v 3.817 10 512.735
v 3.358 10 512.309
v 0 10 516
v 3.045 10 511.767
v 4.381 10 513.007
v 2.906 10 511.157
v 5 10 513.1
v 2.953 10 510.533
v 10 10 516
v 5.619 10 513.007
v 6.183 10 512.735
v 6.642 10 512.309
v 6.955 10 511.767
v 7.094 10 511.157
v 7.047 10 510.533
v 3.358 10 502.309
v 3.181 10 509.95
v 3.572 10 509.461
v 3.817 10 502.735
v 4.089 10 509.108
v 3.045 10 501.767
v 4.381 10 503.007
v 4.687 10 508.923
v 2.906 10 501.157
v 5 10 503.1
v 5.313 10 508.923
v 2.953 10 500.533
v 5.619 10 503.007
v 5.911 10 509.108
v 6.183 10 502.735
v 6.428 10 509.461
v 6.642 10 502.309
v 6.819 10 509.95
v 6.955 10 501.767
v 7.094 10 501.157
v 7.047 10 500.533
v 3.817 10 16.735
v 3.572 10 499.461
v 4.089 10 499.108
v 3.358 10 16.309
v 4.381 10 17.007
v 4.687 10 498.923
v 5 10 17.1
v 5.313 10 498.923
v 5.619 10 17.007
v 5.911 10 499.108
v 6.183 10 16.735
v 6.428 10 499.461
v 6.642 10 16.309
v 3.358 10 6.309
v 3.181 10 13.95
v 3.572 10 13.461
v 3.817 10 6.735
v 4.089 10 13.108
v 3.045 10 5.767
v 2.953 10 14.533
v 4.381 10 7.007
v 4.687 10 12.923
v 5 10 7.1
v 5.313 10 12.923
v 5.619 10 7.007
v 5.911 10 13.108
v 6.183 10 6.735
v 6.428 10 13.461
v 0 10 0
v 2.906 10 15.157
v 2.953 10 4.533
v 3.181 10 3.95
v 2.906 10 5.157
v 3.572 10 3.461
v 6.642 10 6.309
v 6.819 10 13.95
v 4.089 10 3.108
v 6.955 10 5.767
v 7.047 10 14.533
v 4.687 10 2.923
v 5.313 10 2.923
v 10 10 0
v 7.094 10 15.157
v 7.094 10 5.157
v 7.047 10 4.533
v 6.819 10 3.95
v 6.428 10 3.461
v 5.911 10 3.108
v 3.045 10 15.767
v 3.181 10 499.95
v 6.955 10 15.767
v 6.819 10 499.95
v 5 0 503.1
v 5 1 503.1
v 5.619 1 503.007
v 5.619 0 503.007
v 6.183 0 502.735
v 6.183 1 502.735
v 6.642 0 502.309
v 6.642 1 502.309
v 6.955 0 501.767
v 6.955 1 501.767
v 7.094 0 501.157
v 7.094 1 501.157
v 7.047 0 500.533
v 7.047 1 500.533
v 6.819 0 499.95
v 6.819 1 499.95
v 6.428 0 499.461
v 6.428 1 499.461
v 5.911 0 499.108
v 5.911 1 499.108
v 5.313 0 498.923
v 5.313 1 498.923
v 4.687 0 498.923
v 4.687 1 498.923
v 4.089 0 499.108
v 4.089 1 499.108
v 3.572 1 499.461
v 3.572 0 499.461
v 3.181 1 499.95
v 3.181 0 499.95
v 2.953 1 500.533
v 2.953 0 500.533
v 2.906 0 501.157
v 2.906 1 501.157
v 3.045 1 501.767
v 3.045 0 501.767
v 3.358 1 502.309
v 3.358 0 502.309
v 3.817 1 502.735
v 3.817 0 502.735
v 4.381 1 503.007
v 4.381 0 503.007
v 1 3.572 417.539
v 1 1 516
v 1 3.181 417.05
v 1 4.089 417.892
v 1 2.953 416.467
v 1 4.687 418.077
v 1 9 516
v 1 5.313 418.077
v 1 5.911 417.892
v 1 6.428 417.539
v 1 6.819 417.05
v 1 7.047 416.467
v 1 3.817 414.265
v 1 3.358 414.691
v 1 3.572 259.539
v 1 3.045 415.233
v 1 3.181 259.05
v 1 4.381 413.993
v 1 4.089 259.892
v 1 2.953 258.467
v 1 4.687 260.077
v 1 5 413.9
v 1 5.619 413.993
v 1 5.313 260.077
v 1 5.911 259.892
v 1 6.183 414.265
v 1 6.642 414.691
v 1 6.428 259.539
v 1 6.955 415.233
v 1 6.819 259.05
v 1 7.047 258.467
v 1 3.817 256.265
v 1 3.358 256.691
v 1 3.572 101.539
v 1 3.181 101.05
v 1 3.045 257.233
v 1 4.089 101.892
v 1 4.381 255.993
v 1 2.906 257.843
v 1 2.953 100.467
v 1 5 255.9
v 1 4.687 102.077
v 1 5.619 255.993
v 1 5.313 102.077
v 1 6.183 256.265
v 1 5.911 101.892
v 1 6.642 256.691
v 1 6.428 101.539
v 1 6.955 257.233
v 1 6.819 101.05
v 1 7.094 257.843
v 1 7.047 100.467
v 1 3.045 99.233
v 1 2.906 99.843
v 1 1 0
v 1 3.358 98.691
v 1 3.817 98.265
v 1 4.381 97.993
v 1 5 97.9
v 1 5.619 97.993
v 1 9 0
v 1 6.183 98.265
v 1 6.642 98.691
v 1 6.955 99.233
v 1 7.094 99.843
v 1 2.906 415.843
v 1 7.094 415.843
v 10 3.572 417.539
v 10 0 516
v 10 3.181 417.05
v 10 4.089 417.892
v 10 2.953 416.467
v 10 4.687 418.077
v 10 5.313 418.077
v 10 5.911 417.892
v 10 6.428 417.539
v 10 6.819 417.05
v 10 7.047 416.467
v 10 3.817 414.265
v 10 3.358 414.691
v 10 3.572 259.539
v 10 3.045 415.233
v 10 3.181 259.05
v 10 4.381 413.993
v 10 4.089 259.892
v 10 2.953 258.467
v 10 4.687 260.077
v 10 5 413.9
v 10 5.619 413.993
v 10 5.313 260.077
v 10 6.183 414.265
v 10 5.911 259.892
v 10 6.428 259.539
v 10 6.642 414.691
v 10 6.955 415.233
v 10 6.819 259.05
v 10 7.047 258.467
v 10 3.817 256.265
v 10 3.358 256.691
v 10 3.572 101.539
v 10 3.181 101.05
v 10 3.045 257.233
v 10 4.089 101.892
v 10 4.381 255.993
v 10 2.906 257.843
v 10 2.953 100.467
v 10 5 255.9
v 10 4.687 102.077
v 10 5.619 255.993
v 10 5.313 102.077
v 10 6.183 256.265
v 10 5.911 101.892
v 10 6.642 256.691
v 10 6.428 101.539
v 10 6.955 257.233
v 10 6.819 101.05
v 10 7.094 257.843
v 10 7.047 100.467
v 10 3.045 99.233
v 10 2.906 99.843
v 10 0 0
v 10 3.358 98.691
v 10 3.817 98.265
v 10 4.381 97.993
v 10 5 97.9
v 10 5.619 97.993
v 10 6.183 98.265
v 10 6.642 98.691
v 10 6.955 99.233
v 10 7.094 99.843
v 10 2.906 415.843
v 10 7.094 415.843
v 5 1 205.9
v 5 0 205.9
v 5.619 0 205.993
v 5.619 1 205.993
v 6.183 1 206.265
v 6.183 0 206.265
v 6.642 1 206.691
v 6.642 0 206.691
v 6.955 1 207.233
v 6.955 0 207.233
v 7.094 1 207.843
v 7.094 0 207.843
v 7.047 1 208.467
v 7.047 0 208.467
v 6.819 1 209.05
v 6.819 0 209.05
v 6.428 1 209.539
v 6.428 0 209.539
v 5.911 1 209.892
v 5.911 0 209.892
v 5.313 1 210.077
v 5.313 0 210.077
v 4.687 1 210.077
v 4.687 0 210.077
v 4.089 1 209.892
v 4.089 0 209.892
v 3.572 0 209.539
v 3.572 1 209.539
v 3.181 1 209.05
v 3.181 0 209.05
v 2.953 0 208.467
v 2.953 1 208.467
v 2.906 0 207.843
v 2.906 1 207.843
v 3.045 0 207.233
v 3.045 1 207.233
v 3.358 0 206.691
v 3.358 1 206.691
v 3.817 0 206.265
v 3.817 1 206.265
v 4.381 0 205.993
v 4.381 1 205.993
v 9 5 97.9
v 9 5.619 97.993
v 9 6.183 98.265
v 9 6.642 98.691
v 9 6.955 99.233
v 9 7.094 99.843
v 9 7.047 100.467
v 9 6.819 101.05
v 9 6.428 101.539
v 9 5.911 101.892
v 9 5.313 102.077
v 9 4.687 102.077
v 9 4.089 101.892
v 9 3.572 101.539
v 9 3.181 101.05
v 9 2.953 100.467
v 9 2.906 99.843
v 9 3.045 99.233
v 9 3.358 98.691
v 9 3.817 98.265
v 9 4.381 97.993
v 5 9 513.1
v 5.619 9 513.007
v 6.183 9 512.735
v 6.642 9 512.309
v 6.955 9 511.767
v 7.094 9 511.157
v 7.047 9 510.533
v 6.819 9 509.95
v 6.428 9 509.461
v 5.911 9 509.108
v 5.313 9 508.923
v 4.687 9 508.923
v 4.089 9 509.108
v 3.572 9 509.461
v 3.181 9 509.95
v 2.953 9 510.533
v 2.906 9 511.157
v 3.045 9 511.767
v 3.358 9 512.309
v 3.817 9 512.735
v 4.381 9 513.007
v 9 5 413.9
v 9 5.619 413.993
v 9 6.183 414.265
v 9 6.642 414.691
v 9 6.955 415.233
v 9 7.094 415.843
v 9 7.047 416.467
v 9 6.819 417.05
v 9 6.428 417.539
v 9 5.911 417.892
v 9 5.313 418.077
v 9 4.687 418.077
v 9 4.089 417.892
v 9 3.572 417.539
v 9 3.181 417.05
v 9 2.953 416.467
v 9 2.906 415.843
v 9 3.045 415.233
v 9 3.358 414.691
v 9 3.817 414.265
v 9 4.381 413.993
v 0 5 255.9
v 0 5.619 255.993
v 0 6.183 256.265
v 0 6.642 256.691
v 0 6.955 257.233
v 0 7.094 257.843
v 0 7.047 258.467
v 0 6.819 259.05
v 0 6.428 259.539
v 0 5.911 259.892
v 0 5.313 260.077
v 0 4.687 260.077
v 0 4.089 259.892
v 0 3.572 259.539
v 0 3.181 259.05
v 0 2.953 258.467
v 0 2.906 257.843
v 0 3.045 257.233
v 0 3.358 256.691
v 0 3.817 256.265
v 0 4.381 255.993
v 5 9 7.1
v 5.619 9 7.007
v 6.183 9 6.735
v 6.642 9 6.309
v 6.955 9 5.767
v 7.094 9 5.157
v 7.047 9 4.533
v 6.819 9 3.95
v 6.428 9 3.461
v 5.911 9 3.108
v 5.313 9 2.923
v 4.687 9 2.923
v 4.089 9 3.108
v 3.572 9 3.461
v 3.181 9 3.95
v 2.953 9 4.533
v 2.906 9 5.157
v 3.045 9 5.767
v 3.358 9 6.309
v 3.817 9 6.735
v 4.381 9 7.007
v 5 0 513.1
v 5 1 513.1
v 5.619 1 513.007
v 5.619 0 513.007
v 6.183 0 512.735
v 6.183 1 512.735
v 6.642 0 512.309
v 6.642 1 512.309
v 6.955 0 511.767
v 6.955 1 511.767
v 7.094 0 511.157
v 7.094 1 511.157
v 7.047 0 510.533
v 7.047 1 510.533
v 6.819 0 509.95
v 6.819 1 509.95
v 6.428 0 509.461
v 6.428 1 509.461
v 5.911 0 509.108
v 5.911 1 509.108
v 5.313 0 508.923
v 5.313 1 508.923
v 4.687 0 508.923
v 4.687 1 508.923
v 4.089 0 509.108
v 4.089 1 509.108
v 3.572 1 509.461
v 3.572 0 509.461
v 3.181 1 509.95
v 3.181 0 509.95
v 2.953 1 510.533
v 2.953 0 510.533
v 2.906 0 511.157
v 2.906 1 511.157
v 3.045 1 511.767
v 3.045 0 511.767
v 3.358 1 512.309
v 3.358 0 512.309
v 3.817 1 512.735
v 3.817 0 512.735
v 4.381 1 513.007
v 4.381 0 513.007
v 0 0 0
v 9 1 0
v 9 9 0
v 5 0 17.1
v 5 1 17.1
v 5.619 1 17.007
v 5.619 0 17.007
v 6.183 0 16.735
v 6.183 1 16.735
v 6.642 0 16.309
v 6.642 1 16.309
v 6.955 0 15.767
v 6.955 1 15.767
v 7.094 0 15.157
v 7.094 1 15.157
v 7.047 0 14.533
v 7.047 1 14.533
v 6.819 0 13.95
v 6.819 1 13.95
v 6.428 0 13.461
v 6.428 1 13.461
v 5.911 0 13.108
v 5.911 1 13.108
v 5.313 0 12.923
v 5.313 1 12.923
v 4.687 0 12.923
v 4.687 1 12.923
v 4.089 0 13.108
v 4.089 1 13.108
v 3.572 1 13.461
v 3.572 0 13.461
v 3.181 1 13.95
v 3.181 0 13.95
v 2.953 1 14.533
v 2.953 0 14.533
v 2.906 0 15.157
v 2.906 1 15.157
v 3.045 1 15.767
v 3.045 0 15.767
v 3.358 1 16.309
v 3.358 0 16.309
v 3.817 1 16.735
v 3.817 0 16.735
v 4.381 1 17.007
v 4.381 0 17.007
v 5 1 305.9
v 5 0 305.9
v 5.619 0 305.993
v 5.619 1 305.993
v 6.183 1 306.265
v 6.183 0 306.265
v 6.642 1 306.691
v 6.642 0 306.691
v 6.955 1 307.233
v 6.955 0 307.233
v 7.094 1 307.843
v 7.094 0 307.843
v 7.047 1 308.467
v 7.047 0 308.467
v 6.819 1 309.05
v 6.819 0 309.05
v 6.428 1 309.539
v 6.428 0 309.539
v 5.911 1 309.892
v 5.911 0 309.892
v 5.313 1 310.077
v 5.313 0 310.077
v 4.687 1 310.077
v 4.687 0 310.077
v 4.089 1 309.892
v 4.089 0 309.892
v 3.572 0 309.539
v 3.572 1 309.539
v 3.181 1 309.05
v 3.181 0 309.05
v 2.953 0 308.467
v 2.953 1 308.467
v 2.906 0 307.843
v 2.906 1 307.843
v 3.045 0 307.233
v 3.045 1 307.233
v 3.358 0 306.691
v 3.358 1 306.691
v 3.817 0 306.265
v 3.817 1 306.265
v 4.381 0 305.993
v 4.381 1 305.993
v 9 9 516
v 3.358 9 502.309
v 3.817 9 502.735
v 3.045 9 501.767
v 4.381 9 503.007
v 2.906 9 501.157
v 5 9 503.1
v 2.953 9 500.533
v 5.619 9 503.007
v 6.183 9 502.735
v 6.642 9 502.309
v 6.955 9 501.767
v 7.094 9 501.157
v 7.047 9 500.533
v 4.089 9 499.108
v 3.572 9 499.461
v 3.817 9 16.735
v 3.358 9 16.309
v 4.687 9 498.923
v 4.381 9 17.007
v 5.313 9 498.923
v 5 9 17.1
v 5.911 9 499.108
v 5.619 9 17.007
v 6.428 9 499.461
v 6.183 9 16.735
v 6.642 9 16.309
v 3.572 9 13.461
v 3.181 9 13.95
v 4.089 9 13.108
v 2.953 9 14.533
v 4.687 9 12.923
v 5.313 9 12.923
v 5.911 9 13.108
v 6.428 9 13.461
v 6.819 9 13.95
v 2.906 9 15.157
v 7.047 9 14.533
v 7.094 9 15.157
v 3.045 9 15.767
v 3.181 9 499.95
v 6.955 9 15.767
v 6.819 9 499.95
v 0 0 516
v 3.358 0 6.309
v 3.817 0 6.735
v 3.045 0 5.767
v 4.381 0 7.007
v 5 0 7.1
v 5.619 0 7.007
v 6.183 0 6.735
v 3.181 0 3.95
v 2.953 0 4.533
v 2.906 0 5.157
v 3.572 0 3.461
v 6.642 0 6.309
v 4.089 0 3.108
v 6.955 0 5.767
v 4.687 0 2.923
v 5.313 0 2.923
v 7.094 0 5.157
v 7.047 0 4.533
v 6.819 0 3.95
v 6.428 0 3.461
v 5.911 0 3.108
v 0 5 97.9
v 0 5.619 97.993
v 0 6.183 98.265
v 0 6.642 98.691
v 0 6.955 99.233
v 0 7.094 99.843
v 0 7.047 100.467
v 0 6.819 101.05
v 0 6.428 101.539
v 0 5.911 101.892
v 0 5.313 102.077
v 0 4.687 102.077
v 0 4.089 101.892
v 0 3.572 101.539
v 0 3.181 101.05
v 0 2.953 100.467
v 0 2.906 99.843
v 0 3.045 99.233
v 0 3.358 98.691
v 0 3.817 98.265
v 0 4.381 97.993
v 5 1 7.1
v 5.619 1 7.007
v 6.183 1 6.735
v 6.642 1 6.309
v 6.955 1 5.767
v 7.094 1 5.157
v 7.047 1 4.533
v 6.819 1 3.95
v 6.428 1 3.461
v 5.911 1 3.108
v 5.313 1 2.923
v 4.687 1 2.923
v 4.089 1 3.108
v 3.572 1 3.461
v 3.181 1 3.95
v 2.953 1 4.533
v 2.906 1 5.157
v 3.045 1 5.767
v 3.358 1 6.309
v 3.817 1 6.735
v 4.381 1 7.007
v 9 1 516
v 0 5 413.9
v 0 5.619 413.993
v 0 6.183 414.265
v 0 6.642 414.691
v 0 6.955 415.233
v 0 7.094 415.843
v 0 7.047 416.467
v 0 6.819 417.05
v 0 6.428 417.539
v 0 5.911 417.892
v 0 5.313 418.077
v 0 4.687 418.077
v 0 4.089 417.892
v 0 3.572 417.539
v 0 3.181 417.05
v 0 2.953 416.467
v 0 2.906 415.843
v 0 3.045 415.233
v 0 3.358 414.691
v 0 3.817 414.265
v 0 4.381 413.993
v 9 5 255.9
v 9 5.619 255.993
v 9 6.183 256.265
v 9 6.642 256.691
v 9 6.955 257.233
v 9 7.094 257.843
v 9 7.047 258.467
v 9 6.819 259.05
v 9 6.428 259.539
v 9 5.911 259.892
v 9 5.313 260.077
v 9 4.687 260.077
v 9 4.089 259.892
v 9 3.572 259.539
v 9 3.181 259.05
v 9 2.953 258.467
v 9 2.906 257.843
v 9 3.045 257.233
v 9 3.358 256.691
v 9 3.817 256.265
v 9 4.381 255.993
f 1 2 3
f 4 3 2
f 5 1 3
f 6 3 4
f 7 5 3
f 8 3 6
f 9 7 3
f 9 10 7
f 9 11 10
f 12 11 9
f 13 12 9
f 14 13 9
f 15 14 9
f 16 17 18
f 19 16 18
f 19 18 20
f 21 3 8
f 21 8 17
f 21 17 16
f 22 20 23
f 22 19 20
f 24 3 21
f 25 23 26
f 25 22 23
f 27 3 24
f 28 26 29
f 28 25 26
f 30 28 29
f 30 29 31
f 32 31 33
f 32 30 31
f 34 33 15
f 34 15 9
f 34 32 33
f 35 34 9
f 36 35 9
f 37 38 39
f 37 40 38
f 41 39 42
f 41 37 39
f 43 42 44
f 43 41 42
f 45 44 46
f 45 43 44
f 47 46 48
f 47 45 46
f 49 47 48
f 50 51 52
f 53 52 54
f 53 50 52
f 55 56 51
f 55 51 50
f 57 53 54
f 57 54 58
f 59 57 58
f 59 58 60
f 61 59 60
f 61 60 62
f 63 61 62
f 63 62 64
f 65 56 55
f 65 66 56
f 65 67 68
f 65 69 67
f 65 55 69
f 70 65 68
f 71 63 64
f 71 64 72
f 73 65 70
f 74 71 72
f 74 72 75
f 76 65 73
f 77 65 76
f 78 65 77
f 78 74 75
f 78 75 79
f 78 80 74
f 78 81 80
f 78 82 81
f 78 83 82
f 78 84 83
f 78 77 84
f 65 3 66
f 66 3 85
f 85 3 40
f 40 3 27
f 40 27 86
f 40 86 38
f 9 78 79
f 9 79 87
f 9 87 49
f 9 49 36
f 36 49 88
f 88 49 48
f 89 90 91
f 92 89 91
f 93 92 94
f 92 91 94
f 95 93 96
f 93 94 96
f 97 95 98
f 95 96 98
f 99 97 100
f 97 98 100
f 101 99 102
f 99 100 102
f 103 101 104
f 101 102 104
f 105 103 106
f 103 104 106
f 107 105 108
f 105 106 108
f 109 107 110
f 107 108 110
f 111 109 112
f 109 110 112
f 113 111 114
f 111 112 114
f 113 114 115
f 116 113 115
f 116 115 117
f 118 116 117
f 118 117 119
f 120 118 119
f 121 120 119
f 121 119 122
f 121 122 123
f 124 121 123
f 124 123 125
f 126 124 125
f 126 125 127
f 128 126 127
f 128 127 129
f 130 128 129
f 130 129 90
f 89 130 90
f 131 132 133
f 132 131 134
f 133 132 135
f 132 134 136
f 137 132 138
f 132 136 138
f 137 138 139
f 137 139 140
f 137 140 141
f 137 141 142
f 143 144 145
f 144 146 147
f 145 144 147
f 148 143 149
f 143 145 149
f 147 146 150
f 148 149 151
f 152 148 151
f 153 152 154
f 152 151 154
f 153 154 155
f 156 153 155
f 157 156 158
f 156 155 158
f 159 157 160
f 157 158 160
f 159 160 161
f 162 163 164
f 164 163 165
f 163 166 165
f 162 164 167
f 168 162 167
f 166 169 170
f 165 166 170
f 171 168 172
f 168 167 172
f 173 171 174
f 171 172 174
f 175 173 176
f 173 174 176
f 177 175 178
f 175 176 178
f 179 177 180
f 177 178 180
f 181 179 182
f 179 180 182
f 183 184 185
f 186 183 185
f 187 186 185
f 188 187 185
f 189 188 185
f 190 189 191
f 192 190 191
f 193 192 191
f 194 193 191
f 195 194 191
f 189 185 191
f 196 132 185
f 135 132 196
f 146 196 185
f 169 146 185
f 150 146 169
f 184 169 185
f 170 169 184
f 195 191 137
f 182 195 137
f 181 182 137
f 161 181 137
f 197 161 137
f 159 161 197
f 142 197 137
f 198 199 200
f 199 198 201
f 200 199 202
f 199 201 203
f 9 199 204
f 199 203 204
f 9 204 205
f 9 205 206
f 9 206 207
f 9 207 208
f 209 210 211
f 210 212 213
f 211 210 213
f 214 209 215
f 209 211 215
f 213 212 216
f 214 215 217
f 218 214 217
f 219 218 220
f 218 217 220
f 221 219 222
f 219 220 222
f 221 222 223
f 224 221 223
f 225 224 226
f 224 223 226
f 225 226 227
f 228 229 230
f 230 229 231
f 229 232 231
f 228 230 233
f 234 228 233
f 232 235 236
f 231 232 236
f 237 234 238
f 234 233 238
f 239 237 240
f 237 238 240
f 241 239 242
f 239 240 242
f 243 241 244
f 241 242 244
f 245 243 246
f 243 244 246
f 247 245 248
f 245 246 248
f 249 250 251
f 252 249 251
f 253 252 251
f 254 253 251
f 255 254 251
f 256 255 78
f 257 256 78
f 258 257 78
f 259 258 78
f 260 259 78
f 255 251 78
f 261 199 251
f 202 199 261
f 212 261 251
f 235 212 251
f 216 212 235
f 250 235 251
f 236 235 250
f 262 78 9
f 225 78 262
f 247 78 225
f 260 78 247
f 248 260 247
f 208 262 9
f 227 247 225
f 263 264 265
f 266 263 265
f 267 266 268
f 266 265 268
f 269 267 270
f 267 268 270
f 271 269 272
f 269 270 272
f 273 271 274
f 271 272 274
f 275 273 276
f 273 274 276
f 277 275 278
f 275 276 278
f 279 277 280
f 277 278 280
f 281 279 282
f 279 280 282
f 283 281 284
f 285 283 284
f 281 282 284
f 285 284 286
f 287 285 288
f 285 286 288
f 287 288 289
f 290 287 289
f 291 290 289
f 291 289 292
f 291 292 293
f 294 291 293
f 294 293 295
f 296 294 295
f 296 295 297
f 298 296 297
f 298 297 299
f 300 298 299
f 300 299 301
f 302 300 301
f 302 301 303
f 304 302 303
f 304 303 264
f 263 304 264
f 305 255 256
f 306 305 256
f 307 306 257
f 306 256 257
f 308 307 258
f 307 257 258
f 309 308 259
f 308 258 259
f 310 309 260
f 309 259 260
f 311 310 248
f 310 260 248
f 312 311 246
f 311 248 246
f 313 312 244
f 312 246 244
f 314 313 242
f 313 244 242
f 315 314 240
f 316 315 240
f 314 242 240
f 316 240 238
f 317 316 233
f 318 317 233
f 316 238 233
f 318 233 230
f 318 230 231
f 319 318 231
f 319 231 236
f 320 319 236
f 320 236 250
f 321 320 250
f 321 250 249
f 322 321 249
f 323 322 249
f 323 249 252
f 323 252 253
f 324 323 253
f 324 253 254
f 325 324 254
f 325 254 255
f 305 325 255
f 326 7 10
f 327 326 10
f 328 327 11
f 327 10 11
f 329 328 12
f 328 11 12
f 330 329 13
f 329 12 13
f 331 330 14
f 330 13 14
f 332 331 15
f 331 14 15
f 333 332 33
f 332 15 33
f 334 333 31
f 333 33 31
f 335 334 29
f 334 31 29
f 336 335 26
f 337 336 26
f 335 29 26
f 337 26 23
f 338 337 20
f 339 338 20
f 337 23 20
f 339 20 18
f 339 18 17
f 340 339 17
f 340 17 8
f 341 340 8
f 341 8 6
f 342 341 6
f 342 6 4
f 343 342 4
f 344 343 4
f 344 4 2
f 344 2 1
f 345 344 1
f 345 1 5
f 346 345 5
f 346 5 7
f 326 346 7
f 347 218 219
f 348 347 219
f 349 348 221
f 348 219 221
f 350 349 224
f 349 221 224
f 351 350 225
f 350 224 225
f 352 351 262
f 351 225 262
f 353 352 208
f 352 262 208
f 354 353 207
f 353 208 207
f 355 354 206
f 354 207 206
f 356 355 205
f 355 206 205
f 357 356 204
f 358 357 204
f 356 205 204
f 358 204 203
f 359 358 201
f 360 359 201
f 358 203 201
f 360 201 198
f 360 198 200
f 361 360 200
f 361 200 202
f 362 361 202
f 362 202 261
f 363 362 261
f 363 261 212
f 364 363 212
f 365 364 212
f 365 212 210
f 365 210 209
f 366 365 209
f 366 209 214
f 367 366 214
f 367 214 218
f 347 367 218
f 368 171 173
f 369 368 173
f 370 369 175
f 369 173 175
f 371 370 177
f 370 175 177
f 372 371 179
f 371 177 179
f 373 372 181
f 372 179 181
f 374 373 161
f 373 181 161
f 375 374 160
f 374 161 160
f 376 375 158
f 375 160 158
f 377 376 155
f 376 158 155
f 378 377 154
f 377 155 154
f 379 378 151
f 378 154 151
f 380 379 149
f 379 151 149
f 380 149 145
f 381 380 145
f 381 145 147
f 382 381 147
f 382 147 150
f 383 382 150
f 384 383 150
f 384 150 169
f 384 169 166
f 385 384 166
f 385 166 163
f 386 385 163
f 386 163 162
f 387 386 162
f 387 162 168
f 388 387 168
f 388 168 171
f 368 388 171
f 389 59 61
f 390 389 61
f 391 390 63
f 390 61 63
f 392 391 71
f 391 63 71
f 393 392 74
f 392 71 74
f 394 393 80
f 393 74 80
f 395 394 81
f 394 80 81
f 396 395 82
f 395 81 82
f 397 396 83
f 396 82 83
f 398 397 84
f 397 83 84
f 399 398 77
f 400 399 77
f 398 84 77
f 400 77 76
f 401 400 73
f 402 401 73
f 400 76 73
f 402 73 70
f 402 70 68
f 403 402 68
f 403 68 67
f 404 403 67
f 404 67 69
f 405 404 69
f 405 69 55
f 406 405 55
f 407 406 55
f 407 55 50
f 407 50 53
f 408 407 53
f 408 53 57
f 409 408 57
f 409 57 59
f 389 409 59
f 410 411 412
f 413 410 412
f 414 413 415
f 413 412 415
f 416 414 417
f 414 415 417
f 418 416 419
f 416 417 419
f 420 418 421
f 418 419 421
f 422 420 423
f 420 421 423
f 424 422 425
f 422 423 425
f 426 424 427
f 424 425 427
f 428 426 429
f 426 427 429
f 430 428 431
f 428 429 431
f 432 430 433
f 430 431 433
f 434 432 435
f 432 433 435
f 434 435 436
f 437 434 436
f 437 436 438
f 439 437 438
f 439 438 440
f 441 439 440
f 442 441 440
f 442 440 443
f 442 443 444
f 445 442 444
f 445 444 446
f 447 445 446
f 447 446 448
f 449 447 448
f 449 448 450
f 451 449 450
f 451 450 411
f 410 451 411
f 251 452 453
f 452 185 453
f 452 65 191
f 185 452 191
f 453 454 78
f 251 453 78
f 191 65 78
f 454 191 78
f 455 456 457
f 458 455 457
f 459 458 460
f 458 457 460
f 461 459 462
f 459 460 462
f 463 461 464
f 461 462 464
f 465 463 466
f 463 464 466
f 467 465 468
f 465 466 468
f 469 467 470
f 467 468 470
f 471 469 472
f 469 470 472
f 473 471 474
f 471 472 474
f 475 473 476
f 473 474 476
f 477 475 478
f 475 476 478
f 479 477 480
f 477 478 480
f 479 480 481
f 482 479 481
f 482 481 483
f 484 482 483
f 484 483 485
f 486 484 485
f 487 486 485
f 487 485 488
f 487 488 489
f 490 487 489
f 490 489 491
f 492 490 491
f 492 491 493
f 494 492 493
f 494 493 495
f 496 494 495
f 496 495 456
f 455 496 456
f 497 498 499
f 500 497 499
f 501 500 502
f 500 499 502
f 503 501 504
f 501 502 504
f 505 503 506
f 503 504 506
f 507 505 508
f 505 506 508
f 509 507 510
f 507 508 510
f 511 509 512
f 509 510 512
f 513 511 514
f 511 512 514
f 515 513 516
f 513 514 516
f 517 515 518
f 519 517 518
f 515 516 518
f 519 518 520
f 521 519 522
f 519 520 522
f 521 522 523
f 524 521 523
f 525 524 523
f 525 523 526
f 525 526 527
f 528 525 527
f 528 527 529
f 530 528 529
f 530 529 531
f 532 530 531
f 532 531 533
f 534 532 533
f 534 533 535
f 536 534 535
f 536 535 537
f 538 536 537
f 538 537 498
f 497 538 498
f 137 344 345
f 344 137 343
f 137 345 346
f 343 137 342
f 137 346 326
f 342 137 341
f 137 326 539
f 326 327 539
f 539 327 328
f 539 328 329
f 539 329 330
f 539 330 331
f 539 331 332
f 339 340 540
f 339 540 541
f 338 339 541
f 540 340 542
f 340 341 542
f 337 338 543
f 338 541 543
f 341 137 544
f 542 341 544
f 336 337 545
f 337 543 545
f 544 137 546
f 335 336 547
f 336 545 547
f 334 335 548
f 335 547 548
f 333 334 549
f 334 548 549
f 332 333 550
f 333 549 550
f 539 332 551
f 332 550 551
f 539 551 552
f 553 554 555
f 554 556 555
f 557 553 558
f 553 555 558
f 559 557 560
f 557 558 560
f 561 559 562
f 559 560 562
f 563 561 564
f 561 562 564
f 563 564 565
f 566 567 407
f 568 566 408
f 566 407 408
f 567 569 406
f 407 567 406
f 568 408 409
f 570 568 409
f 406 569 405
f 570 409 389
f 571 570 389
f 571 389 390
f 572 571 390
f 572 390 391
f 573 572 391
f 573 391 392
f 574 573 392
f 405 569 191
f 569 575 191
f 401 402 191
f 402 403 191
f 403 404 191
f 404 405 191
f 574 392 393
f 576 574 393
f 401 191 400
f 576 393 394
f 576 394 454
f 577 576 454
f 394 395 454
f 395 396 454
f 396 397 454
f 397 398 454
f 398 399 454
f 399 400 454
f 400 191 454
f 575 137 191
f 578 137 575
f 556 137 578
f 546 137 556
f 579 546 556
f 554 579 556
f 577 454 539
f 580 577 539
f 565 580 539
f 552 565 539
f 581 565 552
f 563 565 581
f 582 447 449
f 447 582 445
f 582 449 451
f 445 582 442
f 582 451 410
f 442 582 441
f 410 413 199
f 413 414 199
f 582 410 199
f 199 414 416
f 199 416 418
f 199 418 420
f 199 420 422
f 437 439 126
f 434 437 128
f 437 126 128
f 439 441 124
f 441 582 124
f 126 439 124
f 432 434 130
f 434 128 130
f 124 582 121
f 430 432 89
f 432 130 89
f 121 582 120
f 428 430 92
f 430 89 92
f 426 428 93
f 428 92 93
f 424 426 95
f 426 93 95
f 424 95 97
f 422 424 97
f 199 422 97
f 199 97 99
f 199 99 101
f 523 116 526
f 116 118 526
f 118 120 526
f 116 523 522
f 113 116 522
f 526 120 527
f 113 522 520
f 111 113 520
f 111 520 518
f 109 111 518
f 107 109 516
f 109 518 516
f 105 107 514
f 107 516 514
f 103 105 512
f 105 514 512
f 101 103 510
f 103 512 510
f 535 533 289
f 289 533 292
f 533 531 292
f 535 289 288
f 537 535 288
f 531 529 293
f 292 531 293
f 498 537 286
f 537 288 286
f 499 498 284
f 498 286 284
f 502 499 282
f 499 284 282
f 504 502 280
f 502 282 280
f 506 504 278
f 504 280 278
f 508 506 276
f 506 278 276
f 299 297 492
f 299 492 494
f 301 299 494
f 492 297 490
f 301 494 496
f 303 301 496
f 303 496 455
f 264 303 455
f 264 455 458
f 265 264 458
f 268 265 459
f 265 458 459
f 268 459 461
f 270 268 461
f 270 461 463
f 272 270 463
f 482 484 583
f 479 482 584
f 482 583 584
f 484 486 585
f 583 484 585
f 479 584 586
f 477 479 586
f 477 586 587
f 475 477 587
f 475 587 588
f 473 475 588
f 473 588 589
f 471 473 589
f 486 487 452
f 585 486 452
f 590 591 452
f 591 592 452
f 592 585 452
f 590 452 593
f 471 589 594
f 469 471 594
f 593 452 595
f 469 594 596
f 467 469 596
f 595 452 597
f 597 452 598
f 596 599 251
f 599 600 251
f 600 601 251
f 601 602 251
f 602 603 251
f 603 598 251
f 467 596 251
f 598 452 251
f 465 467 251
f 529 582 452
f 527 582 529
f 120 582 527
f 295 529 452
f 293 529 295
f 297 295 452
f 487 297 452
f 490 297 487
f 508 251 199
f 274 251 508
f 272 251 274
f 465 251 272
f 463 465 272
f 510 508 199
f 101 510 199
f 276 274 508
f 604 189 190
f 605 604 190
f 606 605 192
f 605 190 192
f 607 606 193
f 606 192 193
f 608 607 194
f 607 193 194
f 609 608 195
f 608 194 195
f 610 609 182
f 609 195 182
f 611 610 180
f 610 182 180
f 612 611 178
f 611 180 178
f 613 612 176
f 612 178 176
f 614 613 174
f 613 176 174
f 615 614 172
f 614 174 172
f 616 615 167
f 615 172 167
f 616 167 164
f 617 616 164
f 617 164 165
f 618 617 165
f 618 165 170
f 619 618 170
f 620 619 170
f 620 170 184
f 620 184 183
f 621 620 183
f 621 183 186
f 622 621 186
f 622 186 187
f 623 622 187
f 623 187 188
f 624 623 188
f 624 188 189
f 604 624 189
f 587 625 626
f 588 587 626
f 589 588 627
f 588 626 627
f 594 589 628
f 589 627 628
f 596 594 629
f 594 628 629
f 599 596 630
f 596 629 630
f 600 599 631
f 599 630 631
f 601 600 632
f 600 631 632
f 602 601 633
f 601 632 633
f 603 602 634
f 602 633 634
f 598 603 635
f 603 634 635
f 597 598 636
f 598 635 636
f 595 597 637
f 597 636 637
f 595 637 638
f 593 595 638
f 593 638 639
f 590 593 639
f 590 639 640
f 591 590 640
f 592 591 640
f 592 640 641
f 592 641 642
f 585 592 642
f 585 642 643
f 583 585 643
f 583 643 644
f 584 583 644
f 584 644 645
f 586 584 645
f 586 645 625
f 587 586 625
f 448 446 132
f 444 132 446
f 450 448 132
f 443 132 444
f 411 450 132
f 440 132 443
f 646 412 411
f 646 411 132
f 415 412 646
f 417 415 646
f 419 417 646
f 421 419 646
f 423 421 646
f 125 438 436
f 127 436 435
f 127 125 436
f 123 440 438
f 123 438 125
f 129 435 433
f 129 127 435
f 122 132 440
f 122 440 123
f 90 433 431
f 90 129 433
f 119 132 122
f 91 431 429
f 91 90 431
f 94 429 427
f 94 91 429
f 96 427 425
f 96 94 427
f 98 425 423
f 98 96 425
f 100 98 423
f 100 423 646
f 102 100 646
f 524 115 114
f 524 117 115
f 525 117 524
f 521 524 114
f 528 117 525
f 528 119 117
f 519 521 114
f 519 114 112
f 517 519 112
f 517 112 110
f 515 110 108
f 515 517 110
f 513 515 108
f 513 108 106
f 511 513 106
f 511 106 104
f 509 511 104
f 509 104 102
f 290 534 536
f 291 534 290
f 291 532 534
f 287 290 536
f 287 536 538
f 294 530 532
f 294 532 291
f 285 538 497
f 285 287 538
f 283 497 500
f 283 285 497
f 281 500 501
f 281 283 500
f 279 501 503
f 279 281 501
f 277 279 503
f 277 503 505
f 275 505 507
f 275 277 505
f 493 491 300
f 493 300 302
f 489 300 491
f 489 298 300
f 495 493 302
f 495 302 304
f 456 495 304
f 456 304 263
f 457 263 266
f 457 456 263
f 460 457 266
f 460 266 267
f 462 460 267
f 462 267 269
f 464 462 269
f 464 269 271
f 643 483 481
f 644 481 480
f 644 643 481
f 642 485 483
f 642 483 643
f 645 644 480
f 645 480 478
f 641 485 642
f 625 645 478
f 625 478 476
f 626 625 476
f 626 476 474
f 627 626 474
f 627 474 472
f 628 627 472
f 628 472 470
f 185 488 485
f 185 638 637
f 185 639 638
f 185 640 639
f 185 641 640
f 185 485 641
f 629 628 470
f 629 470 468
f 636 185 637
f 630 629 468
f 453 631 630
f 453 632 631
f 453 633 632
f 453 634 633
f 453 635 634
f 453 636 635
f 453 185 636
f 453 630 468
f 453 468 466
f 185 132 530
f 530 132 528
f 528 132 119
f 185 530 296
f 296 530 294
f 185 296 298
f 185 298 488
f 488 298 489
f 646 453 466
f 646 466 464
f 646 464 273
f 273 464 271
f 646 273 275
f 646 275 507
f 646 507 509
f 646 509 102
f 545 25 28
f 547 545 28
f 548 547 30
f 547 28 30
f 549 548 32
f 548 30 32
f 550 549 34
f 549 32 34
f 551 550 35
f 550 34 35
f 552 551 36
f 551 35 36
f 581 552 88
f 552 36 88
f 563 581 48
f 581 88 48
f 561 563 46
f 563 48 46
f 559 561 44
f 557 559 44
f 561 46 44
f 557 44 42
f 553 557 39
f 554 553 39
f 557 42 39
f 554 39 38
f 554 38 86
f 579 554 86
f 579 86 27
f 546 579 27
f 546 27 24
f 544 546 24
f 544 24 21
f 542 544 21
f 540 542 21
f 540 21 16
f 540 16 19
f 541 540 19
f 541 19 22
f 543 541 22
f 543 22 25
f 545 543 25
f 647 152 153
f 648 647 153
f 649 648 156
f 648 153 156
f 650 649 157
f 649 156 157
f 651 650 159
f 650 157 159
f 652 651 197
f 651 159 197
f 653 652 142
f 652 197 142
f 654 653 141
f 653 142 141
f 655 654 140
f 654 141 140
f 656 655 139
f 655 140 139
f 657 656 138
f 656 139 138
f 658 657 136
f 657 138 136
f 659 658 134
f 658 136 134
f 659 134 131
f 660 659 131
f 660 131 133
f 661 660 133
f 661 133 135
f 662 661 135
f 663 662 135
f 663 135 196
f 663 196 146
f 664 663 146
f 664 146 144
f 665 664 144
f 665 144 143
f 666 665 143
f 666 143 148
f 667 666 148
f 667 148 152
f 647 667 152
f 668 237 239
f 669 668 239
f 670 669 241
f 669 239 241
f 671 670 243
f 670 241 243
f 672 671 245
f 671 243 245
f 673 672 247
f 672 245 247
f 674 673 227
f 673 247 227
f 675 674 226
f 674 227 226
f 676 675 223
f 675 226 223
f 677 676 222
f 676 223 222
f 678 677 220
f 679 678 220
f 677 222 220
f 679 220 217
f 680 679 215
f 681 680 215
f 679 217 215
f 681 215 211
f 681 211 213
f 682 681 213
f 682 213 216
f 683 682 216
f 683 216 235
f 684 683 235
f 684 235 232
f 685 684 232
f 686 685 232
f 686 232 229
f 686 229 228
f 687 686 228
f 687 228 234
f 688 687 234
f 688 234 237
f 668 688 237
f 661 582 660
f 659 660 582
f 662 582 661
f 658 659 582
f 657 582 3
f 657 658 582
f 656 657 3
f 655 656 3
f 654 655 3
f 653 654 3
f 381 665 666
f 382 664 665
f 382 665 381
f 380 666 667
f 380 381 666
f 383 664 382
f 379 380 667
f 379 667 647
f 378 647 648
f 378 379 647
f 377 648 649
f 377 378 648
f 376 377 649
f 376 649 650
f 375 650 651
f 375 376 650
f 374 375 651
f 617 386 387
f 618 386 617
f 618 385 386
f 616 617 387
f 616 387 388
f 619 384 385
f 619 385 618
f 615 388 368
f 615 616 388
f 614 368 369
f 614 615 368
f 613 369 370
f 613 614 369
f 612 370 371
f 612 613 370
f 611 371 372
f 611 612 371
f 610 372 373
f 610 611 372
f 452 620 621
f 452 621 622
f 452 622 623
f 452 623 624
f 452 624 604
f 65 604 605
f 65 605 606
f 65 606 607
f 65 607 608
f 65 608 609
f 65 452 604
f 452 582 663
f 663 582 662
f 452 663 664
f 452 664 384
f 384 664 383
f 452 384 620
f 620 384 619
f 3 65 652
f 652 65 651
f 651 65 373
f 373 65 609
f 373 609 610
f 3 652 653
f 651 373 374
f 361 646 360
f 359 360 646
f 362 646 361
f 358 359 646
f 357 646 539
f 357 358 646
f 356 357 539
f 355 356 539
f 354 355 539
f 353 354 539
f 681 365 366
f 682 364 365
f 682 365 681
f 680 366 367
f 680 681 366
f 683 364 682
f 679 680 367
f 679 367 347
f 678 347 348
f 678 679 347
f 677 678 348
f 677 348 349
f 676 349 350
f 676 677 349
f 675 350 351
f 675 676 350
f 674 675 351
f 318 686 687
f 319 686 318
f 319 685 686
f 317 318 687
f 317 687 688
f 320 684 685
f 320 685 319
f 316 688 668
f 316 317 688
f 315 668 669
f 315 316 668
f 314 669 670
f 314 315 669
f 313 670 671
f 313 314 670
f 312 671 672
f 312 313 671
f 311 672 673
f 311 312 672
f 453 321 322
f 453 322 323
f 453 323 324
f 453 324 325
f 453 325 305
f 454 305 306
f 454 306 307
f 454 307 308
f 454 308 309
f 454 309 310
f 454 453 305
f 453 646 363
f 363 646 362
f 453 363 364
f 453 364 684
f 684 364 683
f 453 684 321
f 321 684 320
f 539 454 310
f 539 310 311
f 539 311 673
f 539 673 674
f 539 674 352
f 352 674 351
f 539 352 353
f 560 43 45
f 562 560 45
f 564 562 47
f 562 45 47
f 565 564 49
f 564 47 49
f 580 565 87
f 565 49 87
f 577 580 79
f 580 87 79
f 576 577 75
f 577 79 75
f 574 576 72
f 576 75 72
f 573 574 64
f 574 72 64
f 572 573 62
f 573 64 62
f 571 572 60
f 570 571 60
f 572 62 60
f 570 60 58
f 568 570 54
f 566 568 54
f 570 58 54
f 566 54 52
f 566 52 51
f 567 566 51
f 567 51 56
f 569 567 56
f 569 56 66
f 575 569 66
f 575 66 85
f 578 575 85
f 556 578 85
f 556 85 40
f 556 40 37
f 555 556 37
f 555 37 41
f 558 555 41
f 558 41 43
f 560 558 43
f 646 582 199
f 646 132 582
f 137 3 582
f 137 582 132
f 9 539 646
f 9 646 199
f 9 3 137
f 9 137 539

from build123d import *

# Parameters (mm, degrees)
SKETCH1_W           = 10
SKETCH1_H           = 10
SKETCH1_W_2         = 8
SKETCH1_H_2         = 8
BOSS_EXTRUDE1_DEPTH = 516
SKETCH2_R           = 2.1
CUT_EXTRUDE1_DEPTH  = 116
SKETCH3_R           = 2.1
CUT_EXTRUDE2_DEPTH  = 5
SKETCH4_R           = 2.1
CUT_EXTRUDE3_DEPTH  = 10


with BuildPart() as part:
    # Sketch1 → Boss-Extrude1 (new body)
    with BuildSketch(Plane.XY):
        with Locations((5, 5)):
            Rectangle(SKETCH1_W, SKETCH1_H)
        with Locations((5, 5)):
            Rectangle(SKETCH1_W_2, SKETCH1_H_2, mode=Mode.SUBTRACT)
    extrude(amount=BOSS_EXTRUDE1_DEPTH)

    # Sketch2 → Cut-Extrude1 (cut)
    with BuildSketch(Plane(origin=(0, 10, 0), x_dir=(1, 0, 0), z_dir=(0, 1, 0))):
        with Locations(Location((5, -5, 0), (0, 0, 270))):
            Circle(SKETCH2_R)
        with Locations(Location((5, -15, 0), (0, 0, 270))):
            Circle(SKETCH2_R)
        with Locations(Location((5, -501, 0), (0, 0, 270))):
            Circle(SKETCH2_R)
        with Locations(Location((5, -511, 0), (0, 0, 270))):
            Circle(SKETCH2_R)
    extrude(amount=-CUT_EXTRUDE1_DEPTH, mode=Mode.SUBTRACT)

    # Sketch3 → Cut-Extrude2 (cut)
    with BuildSketch(Plane.XZ):
        with Locations(Location((5, 308, 0), (0, 0, 270))):
            Circle(SKETCH3_R)
        with Locations(Location((5, 208, 0), (0, 0, 270))):
            Circle(SKETCH3_R)
    extrude(amount=-CUT_EXTRUDE2_DEPTH, mode=Mode.SUBTRACT)

    # Sketch4 → Cut-Extrude3 (cut)
    with BuildSketch(Plane(origin=(10, 0, 0), x_dir=(0, 0, -1), z_dir=(1, 0, 0))):
        with Locations((-416, 5)):
            Circle(SKETCH4_R)
        with Locations((-100, 5)):
            Circle(SKETCH4_R)
        with Locations((-258, 5)):
            Circle(SKETCH4_R)
    extrude(amount=-CUT_EXTRUDE3_DEPTH, mode=Mode.SUBTRACT)


solid = part.part
